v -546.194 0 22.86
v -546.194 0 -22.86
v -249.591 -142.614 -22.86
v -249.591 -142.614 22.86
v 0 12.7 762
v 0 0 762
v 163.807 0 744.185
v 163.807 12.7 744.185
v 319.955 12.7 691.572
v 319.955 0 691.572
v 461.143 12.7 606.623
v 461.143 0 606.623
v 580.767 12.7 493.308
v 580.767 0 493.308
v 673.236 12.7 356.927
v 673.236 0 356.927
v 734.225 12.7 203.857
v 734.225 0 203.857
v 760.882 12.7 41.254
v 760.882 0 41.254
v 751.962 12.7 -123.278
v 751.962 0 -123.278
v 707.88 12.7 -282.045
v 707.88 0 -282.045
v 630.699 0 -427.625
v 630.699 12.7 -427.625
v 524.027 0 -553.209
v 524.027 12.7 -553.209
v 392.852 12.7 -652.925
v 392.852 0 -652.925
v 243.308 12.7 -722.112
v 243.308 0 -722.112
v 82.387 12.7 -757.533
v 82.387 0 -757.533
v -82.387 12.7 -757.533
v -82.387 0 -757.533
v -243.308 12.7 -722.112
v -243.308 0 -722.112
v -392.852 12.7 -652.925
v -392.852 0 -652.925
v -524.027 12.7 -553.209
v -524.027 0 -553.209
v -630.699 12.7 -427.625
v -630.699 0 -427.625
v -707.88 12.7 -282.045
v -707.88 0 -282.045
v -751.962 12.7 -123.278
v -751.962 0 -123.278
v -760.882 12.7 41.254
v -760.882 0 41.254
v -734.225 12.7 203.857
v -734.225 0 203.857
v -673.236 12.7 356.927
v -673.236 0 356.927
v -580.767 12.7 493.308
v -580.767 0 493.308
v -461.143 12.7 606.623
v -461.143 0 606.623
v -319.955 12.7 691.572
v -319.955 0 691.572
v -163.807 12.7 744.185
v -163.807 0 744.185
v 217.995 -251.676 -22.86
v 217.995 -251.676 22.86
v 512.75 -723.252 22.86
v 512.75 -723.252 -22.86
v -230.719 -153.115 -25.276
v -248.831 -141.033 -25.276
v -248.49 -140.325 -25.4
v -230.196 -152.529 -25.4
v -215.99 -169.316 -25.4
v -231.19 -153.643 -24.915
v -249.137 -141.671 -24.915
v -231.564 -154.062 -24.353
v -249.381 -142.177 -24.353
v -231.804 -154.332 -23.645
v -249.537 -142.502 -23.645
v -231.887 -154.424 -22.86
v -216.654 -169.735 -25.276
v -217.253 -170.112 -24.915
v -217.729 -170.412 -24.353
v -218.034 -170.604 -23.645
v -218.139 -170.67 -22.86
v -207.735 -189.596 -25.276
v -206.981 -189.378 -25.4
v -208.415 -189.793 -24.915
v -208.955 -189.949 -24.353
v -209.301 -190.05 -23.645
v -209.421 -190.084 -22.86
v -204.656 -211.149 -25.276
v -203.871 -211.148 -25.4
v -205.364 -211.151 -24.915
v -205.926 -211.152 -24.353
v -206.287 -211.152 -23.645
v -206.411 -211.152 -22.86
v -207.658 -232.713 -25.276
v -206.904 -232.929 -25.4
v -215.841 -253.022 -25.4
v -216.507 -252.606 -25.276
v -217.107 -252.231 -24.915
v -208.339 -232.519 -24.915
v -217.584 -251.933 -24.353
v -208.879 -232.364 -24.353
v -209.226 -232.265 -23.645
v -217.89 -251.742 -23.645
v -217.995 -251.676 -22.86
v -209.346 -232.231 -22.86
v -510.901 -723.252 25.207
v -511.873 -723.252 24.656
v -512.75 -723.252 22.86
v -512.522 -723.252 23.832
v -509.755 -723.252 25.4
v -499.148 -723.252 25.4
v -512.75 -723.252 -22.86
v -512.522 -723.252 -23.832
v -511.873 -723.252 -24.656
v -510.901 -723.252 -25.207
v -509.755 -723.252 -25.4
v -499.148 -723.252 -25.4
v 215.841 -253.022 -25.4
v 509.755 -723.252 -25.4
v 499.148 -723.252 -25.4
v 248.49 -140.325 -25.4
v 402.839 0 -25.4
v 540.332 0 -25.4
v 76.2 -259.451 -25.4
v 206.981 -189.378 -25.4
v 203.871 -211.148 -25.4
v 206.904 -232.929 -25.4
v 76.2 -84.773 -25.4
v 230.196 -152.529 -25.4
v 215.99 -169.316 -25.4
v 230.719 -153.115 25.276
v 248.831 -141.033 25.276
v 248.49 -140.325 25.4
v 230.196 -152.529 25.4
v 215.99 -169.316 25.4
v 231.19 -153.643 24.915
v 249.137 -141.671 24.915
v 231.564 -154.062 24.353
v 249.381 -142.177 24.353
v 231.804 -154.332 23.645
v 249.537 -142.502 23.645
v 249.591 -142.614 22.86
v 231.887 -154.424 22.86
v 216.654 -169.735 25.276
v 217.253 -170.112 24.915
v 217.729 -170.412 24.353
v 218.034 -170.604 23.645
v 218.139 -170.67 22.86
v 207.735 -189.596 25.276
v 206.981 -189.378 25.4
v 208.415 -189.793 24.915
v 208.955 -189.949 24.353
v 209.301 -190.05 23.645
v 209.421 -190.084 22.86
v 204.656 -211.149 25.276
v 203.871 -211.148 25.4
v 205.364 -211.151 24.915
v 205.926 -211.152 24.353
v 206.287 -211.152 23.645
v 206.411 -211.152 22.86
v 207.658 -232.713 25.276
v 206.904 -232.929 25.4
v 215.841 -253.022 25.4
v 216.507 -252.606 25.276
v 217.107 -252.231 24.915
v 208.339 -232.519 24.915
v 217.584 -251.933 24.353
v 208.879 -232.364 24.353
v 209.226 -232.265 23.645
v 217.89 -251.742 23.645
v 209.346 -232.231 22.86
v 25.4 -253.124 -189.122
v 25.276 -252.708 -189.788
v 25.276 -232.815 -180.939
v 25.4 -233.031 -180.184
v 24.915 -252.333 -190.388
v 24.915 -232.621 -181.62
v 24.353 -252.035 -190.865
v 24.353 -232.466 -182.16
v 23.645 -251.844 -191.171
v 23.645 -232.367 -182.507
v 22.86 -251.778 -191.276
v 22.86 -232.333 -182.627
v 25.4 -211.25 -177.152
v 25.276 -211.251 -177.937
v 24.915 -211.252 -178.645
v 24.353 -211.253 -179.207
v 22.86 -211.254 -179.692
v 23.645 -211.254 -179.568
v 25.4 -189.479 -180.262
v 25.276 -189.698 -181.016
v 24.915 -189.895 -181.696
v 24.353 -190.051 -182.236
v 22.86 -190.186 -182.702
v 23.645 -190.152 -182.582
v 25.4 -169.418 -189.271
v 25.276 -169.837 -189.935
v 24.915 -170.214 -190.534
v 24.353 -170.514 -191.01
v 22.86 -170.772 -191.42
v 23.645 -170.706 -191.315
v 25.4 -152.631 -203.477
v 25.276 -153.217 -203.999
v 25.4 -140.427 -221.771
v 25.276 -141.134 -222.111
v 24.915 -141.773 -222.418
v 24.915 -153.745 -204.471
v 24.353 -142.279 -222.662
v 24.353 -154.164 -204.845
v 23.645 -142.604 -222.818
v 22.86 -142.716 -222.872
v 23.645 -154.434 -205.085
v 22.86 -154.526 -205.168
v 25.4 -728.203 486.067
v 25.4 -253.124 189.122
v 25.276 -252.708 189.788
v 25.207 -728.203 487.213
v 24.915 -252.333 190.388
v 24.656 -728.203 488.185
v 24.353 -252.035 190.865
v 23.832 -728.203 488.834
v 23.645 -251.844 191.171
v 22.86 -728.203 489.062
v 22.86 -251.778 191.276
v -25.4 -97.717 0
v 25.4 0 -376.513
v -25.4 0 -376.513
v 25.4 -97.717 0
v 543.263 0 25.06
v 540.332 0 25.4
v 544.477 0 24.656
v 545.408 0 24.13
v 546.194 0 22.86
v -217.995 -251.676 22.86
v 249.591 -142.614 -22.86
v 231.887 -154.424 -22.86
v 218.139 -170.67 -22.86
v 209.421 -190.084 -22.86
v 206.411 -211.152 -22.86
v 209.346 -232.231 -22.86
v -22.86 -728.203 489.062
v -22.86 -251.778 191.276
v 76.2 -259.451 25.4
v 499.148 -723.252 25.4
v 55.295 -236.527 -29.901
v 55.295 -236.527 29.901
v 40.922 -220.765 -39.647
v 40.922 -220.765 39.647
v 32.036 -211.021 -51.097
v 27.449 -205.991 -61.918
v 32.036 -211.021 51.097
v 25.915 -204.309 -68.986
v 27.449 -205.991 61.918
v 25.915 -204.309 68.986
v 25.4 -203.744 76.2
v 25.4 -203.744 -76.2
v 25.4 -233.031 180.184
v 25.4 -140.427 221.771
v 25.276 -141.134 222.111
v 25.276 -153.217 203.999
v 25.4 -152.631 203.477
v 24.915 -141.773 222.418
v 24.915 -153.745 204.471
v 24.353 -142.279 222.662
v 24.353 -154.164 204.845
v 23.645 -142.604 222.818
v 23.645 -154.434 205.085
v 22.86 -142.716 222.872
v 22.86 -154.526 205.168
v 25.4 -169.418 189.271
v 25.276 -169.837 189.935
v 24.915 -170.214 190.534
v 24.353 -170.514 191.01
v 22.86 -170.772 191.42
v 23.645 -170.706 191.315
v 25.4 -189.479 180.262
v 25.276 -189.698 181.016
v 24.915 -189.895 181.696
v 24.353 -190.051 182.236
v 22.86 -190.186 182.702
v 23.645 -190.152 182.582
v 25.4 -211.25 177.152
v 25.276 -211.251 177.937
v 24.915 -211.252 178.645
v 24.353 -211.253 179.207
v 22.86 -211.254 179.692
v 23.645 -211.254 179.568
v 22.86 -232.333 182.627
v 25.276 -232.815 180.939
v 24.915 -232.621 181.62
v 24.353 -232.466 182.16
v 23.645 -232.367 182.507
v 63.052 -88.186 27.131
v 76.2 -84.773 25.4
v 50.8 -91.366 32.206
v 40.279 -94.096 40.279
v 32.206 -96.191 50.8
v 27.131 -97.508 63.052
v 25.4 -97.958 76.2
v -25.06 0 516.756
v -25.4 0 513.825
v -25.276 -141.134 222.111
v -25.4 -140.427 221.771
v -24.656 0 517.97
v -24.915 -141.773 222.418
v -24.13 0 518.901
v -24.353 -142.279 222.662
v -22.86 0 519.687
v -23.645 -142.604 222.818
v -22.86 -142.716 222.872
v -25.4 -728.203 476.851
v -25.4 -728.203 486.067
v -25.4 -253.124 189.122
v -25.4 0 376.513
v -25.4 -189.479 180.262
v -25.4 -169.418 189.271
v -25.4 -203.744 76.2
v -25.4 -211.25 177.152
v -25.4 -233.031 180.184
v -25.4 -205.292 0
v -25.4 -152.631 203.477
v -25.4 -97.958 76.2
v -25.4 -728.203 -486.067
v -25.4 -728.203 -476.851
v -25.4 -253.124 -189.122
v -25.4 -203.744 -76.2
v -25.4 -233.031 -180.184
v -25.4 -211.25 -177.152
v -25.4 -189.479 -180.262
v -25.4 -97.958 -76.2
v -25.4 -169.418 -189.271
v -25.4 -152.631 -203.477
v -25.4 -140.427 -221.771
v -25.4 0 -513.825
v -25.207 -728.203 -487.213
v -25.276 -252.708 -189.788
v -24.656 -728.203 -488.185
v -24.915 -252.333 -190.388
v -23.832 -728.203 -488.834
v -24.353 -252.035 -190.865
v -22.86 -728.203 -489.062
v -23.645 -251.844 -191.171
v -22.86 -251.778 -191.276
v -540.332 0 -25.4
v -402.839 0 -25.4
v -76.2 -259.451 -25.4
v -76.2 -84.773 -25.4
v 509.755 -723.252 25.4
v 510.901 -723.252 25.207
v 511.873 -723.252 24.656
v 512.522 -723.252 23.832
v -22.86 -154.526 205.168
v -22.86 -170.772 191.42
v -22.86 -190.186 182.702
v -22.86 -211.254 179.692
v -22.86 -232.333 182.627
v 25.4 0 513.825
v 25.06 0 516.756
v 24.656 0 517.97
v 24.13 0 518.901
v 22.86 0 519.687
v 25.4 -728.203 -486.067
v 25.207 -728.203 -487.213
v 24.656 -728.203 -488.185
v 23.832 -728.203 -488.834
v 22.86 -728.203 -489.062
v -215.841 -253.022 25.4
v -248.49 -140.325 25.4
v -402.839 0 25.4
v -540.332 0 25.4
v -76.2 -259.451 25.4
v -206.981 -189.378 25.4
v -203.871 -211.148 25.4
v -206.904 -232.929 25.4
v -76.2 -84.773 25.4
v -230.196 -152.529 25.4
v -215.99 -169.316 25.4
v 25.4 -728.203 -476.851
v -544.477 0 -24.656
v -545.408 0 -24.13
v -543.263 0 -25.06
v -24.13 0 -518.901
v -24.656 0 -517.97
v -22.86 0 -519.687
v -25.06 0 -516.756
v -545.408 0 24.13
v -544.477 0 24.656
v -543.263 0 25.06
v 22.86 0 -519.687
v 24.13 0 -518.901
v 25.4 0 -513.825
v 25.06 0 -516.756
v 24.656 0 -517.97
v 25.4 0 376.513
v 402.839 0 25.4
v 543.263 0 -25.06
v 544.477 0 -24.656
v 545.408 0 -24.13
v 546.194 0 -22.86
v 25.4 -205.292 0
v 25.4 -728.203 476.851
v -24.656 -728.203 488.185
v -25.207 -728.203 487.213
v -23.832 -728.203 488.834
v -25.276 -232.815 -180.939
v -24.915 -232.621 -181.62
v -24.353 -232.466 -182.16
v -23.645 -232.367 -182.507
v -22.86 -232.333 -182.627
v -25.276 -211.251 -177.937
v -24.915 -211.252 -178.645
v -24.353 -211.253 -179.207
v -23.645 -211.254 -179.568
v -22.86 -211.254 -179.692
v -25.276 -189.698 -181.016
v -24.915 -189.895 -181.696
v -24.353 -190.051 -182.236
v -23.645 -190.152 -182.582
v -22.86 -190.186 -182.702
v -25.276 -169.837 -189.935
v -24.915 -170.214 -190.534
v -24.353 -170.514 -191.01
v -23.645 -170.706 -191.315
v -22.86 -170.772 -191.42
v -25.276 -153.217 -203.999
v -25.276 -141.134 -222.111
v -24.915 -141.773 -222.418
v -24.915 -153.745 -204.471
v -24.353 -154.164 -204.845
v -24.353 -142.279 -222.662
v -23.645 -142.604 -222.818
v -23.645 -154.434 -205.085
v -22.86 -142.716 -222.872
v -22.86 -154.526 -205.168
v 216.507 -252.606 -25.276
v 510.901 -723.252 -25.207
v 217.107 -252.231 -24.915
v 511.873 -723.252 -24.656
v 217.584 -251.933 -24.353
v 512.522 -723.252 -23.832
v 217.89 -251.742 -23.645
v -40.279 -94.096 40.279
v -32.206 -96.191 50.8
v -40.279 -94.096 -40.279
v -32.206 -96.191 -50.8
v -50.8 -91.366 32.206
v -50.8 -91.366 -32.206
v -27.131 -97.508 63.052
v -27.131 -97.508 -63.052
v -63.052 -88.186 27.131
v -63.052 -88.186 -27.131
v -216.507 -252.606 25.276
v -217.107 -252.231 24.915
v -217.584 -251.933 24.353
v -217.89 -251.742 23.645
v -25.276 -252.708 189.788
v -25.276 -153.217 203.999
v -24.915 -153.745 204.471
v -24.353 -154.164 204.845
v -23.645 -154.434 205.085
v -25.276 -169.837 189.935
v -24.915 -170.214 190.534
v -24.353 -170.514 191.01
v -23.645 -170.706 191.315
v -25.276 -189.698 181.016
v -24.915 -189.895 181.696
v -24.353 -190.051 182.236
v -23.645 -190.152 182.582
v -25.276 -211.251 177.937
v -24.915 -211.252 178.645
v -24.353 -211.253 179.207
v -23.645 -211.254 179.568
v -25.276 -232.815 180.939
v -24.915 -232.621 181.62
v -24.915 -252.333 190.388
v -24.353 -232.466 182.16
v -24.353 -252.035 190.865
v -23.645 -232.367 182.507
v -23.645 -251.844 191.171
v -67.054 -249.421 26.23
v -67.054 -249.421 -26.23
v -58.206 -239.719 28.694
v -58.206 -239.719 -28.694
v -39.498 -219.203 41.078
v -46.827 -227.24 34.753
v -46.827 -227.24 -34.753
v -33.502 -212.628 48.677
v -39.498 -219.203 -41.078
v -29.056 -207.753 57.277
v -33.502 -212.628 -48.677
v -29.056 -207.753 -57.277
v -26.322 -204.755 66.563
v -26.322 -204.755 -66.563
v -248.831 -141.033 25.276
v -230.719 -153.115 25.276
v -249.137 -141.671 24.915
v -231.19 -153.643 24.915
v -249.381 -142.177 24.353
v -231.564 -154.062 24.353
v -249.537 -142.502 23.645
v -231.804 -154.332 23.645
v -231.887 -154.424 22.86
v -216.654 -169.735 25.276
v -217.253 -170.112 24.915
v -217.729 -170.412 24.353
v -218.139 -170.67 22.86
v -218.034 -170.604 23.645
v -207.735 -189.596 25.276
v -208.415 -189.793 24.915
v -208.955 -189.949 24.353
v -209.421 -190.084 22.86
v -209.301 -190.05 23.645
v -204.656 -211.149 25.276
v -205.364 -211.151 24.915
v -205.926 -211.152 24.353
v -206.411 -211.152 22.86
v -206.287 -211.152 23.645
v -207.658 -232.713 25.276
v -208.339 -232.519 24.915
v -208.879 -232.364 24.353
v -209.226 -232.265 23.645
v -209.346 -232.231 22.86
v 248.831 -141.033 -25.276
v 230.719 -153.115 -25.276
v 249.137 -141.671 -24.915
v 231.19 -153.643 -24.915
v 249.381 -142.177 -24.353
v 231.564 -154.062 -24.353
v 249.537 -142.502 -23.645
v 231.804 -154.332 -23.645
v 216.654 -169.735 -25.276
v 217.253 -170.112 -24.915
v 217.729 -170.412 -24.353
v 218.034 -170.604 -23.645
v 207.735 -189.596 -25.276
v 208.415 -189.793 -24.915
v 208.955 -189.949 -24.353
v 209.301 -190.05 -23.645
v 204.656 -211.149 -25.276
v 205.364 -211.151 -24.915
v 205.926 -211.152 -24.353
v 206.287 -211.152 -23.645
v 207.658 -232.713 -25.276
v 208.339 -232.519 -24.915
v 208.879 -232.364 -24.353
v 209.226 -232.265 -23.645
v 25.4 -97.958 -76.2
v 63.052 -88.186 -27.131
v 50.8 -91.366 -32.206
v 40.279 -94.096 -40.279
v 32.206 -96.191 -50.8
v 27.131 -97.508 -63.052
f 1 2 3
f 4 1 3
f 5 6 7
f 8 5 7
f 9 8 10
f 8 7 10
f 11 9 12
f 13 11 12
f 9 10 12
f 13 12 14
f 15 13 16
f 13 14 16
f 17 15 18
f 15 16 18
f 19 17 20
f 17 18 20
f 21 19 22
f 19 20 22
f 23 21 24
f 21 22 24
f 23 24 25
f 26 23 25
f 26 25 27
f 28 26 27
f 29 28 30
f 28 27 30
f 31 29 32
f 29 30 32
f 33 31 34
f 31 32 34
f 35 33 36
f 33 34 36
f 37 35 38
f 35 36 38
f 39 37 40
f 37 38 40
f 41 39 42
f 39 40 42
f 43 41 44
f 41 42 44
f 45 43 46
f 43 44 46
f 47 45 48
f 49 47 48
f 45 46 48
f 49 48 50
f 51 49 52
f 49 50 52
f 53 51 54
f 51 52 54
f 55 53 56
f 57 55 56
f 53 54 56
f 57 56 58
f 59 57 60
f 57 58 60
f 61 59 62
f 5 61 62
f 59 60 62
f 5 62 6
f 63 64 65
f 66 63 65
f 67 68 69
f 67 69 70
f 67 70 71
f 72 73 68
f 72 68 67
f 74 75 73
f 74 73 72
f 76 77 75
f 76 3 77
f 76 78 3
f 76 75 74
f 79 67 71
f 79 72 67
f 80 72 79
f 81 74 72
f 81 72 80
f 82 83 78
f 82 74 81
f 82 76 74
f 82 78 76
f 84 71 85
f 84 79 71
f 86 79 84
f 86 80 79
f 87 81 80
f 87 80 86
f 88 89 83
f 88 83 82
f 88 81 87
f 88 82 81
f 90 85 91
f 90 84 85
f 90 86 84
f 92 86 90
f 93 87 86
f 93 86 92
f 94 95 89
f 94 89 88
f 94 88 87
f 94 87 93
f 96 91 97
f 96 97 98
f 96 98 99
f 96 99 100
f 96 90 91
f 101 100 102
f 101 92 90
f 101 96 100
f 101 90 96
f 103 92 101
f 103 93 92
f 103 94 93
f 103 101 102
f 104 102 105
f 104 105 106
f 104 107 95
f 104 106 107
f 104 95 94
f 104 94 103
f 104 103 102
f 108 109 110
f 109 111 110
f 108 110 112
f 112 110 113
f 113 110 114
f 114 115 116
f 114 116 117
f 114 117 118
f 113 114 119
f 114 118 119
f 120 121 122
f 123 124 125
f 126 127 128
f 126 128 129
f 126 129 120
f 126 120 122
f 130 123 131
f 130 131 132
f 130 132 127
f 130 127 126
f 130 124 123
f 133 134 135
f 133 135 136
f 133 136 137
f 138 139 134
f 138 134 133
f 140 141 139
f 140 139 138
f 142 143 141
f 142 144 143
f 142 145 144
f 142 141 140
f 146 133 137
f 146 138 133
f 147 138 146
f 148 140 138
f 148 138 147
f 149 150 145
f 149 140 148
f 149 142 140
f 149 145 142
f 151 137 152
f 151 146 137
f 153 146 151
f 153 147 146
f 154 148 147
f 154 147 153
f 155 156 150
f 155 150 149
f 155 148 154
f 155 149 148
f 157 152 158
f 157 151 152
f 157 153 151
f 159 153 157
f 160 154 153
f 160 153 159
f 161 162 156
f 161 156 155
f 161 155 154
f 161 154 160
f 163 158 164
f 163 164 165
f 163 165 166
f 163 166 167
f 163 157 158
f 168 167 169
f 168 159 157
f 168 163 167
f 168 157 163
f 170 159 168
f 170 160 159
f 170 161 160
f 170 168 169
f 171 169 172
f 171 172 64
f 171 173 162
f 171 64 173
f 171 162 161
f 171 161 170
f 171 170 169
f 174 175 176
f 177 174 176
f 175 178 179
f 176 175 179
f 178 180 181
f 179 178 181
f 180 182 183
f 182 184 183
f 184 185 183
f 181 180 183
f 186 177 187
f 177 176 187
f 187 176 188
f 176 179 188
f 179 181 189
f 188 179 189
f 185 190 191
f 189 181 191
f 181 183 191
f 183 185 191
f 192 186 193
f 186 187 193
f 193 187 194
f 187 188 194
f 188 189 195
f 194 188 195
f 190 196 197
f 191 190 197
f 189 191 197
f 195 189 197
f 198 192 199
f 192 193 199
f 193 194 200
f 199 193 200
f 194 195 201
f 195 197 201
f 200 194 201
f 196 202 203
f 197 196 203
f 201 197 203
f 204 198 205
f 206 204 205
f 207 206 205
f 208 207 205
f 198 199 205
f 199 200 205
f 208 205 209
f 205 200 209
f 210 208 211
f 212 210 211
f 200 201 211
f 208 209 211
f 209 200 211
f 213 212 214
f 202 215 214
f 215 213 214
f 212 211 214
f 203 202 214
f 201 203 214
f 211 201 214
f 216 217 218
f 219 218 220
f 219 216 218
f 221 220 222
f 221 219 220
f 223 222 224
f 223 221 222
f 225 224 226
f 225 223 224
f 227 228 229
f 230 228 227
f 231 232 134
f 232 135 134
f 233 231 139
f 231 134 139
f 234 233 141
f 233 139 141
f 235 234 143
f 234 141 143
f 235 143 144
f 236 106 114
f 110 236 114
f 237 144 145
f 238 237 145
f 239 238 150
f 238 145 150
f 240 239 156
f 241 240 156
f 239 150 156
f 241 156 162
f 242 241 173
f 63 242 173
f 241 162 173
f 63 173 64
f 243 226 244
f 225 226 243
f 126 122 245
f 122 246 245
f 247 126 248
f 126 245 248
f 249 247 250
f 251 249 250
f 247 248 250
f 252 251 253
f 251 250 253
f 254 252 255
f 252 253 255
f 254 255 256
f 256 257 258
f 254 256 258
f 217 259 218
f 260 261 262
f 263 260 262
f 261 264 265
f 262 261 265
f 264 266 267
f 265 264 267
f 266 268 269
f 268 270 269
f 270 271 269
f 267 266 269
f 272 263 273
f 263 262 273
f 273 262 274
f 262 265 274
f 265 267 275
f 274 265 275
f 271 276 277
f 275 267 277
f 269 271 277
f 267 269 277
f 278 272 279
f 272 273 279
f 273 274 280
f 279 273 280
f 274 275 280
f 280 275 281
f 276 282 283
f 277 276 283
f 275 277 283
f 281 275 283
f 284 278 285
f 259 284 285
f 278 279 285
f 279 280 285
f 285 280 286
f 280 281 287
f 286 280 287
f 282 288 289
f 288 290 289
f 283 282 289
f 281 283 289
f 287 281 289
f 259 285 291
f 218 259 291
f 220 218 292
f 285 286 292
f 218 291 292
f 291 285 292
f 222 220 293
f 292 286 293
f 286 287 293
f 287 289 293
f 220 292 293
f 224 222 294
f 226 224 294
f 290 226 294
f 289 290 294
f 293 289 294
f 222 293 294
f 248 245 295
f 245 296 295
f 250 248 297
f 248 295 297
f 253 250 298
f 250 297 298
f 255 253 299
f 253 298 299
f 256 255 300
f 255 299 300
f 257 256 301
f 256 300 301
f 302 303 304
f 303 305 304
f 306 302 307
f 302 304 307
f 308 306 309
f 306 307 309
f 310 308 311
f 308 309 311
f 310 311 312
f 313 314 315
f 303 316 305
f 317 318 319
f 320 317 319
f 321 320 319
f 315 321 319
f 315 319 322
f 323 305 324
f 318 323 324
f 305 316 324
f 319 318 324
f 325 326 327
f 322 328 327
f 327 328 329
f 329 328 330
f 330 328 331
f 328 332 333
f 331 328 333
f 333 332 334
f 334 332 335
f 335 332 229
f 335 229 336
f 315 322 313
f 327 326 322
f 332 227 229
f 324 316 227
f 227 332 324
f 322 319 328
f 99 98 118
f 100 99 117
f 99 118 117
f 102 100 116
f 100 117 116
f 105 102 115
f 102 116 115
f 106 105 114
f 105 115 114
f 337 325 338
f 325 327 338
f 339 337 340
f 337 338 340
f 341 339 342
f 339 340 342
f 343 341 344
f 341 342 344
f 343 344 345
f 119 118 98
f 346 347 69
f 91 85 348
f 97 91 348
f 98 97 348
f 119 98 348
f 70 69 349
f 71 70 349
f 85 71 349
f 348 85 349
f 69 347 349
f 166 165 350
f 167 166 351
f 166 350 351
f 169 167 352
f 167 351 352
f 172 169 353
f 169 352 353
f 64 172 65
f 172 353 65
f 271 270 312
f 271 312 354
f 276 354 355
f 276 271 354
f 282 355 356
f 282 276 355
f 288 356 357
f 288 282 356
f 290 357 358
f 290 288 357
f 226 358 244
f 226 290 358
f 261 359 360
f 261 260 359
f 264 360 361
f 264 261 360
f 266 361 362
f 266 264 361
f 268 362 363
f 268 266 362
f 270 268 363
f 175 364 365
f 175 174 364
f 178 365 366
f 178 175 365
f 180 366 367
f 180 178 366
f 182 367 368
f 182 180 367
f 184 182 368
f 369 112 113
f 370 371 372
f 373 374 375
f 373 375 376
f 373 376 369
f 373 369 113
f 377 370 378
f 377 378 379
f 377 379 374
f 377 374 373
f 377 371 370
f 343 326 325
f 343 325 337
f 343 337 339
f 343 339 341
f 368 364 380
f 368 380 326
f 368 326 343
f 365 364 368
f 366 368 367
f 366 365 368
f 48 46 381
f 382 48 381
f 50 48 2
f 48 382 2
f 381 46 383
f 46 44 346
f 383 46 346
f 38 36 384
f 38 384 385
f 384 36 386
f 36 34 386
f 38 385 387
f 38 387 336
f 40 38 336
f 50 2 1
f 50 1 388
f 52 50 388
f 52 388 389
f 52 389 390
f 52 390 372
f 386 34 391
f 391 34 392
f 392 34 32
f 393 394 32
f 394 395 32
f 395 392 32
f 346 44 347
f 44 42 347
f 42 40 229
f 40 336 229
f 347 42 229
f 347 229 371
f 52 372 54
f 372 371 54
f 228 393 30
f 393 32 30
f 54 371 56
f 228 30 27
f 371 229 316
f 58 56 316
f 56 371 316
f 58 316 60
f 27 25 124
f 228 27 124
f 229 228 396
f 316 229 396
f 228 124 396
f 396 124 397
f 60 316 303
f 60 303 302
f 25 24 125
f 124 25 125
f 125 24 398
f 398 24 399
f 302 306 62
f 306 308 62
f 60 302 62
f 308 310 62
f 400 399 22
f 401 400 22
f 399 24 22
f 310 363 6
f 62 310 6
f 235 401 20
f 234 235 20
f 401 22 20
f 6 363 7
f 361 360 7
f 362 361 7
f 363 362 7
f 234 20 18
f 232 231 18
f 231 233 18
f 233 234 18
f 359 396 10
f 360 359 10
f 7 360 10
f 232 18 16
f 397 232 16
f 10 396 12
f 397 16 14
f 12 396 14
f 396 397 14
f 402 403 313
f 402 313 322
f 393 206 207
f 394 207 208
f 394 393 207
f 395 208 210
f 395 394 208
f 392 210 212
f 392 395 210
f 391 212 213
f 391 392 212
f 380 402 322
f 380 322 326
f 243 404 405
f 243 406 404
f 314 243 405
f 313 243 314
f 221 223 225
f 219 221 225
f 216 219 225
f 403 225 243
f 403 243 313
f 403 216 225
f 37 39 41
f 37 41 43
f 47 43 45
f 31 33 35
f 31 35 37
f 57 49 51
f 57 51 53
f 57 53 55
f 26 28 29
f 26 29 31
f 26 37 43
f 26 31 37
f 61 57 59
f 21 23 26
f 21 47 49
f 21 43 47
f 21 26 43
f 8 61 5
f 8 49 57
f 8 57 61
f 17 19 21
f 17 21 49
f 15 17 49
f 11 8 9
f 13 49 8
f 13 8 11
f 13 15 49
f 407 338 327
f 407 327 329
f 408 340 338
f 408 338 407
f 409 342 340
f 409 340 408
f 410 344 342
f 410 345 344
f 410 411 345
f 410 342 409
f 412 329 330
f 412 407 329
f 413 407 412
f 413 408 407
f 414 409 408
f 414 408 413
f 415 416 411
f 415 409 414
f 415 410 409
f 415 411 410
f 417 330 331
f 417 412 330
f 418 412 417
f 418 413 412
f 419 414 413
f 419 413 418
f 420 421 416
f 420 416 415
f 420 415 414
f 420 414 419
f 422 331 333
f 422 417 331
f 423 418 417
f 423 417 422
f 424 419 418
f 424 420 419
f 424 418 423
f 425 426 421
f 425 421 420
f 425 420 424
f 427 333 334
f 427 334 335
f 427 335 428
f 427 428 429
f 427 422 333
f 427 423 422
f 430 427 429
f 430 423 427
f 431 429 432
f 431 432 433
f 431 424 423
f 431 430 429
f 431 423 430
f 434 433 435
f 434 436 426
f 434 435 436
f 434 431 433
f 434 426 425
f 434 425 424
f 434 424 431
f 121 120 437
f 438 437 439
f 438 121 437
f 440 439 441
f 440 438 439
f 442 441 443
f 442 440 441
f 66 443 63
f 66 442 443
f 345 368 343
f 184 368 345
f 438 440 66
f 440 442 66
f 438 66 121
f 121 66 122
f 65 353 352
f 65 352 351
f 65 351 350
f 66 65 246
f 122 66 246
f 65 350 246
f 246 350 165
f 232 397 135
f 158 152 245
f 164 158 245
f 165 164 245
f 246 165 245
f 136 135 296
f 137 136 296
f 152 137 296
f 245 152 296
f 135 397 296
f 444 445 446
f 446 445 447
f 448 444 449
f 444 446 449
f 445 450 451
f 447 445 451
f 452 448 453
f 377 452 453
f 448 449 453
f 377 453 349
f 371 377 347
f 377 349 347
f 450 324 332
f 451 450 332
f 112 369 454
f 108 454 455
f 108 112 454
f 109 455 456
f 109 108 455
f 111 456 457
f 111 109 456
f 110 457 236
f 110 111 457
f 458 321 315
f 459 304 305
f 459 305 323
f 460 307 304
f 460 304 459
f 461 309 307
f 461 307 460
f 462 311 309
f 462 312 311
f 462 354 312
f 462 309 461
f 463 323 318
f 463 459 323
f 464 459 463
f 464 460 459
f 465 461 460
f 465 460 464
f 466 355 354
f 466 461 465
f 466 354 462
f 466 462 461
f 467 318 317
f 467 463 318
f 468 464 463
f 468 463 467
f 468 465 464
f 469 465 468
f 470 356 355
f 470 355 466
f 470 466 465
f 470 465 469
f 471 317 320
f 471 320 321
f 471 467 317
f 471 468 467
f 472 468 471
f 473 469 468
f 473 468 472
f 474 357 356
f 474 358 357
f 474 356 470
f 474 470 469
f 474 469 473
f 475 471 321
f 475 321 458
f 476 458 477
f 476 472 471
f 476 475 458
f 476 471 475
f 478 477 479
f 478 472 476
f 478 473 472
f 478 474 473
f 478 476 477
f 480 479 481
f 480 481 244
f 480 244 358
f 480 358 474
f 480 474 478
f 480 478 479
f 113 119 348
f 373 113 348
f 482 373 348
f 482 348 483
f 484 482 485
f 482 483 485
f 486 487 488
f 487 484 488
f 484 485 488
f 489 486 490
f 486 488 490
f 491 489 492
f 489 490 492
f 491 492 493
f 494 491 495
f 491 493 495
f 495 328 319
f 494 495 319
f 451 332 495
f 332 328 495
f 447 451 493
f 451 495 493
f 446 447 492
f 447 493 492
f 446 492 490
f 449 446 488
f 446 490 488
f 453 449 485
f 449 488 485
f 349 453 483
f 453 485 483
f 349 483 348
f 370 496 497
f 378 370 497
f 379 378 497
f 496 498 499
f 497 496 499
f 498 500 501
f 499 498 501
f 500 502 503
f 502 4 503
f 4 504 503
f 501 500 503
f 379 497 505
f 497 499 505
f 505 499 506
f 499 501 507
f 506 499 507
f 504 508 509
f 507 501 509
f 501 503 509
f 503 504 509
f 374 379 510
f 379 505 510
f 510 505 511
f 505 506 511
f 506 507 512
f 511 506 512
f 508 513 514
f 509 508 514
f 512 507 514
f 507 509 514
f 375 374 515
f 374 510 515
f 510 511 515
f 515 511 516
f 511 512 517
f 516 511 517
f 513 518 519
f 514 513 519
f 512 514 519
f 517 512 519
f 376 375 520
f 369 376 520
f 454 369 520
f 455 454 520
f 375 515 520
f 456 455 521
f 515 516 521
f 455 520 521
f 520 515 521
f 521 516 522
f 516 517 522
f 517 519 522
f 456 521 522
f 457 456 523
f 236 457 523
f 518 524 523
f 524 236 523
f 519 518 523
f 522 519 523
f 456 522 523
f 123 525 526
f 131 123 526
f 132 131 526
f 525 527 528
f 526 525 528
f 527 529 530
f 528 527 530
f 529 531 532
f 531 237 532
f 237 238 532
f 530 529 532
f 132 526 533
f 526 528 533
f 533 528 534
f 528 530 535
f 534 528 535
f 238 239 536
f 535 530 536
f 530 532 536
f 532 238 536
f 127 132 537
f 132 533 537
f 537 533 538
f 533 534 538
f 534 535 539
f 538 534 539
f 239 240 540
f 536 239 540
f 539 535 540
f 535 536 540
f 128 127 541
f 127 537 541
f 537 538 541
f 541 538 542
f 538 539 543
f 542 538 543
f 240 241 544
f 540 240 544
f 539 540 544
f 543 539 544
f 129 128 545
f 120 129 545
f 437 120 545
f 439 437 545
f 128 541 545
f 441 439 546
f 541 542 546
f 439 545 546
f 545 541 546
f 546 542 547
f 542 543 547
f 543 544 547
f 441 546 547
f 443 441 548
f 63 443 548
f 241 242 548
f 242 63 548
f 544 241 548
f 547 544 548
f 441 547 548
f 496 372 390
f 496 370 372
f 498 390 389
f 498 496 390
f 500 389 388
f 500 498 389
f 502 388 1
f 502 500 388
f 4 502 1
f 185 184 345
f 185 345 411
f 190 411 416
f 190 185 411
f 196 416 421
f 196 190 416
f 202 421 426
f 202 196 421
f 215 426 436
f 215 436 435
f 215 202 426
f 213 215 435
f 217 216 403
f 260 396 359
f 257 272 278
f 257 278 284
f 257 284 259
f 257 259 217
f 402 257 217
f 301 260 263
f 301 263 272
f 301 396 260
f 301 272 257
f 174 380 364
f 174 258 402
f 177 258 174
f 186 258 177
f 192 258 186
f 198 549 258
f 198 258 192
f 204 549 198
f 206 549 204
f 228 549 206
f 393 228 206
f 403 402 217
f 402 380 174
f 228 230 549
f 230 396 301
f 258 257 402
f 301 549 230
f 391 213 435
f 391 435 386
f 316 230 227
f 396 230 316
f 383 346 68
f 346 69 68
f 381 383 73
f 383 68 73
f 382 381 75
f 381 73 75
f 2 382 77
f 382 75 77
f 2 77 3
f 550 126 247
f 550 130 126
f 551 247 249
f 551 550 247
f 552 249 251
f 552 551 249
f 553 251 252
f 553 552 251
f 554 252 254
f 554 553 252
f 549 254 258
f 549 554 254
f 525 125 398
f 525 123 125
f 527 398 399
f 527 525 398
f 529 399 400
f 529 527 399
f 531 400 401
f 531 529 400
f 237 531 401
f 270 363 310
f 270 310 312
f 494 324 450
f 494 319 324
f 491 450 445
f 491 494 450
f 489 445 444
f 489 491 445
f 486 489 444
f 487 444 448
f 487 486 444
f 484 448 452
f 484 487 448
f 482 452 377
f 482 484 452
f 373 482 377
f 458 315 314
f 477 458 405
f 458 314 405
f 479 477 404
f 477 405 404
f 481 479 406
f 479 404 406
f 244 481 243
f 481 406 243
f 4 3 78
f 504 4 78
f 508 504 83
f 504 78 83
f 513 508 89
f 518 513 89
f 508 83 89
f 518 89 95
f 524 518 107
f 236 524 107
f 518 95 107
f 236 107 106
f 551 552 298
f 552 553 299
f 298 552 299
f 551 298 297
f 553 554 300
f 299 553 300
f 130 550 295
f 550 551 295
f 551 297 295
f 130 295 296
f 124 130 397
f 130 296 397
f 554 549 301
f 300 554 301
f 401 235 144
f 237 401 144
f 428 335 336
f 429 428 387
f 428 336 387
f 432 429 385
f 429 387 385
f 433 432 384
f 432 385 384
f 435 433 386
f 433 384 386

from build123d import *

# Parameters (mm, degrees)
SKETCH2_R           = 762
BOSS_EXTRUDE1_DEPTH = 12.7
BOSS_EXTRUDE2_DEPTH = 25.4
BOSS_EXTRUDE3_DEPTH = 25.4
FILLET1_R           = 50.8
FILLET2_R           = 50.8
FILLET3_R           = 2.54


with BuildPart() as part:
    # Sketch2 → Boss-Extrude1 (new body)
    with BuildSketch(Plane(origin=(0, 0, 0), x_dir=(1, 0, 0), z_dir=(0, 1, 0))):
        with Locations(Location((0, 0, 0), (0, 0, 270))):
            Circle(SKETCH2_R)
    extrude(amount=BOSS_EXTRUDE1_DEPTH)

    # Sketch3 → Boss-Extrude2 (add, symmetric)
    with BuildSketch(Plane(origin=(0, 0, 0), x_dir=(0, 0, -1), z_dir=(1, 0, 0))):
        with BuildLine():
            Line((-376.512914222, 0), (-519.686562072, 0))
            Line((-519.686562072, 0), (-222.871959454, -142.716140502))
            ThreePointArc((-222.871959454, -142.716140502), (-182.701733049, -190.186232292), (-191.275920014, -251.777952693))
            Line((-191.275920014, -251.777952693), (-489.061959381, -728.203177114))
            Line((-489.061959381, -728.203177114), (-476.851322016, -728.203177114))
            Line((-476.851322016, -728.203177114), (0, -205.292352404))
            Line((0, -205.292352404), (476.851322016, -728.203177114))
            Line((476.851322016, -728.203177114), (489.061959381, -728.203177114))
            Line((489.061959381, -728.203177114), (191.275920014, -251.777952693))
            ThreePointArc((191.275920014, -251.777952693), (182.701733049, -190.186232292), (222.871959454, -142.716140502))
            Line((222.871959454, -142.716140502), (519.686562072, 0))
            Line((519.686562072, 0), (376.512914222, 0))
            Line((376.512914222, 0), (0, -97.717234055))
            Line((0, -97.717234055), (-376.512914222, 0))
        make_face()
    extrude(amount=BOSS_EXTRUDE2_DEPTH, both=True)

    # Sketch5 → Boss-Extrude3 (add, symmetric)
    with BuildSketch(Plane.XY):
        with BuildLine():
            Line((-547.036781798, 0.405352419), (-249.591046968, -142.614252779))
            ThreePointArc((-249.591046968, -142.614252779), (-209.420820563, -190.08434457), (-217.995007528, -251.676064971))
            Line((-217.995007528, -251.676064971), (-512.749991198, -723.251930457))
            Line((-512.749991198, -723.251930457), (-499.148196201, -723.251930457))
            Line((-499.148196201, -723.251930457), (-3.147209779, -179.341757847))
            Line((-3.147209779, -179.341757847), (-3.147209779, -103.733008189))
            Line((-3.147209779, -103.733008189), (-404.401277334, 0.405352419))
            Line((-404.401277334, 0.405352419), (-547.036781798, 0.405352419))
        make_face()
        with BuildLine():
            ThreePointArc((249.591046968, -142.614252779), (209.420820563, -190.08434457), (217.995007528, -251.676064971))
            Line((217.995007528, -251.676064971), (512.749991198, -723.251930457))
            Line((512.749991198, -723.251930457), (499.148196201, -723.251930457))
            Line((499.148196201, -723.251930457), (3.147209779, -179.341757847))
            Line((3.147209779, -179.341757847), (3.147209779, -103.733008189))
            Line((3.147209779, -103.733008189), (404.401277334, 0.405352419))
            Line((404.401277334, 0.405352419), (547.036781798, 0.405352419))
            Line((547.036781798, 0.405352419), (249.591046968, -142.614252779))
        make_face()
    extrude(amount=BOSS_EXTRUDE3_DEPTH, both=True)

    # Fillet1
    fillet1_edges = [part.edges().sort_by_distance(p)[0] for p in [
        (25.4, -150.850828677, 25.4),
    ]]
    fillet(fillet1_edges, radius=FILLET1_R)

    # Fillet2
    fillet2_edges = [part.edges().sort_by_distance(p)[0] for p in [
        (-25.4, -150.850828677, -25.4),
        (-25.4, -150.850828677, 25.4),
        (25.4, -150.850828677, -25.4),
    ]]
    fillet(fillet2_edges, radius=FILLET2_R)

    # Fillet3
    fillet3_edges = [part.edges().sort_by_distance(p)[0] for p in [
        (-25.4, -489.990564904, 340.168939697),
        (25.4, -489.990564904, -340.168939697),
        (25.4, -190.186232292, -182.701733049),
        (25.4, -71.358070251, -371.279260763),
        (25.4, -71.358070251, 371.279260763),
        (25.4, -190.186232292, 182.701733049),
        (25.4, -489.990564904, 340.168939697),
        (-25.4, -71.358070251, -371.279260763),
        (-25.4, -190.186232292, -182.701733049),
        (-25.4, -489.990564904, -340.168939697),
        (-397.892397529, -71.30712639, -25.4),
        (-397.892397529, -71.30712639, 25.4),
        (-209.420820563, -190.08434457, 25.4),
        (-365.372499363, -487.463997714, 25.4),
        (-209.420820563, -190.08434457, -25.4),
        (-365.372499363, -487.463997714, -25.4),
        (397.892397529, -71.30712639, 25.4),
        (397.892397529, -71.30712639, -25.4),
        (209.420820563, -190.08434457, -25.4),
        (365.372499363, -487.463997714, -25.4),
        (209.420820563, -190.08434457, 25.4),
        (365.372499363, -487.463997714, 25.4),
        (-25.4, -71.358070251, 371.279260763),
        (-25.4, -190.186232292, 182.701733049),
    ]]
    fillet(fillet3_edges, radius=FILLET3_R)


solid = part.part
